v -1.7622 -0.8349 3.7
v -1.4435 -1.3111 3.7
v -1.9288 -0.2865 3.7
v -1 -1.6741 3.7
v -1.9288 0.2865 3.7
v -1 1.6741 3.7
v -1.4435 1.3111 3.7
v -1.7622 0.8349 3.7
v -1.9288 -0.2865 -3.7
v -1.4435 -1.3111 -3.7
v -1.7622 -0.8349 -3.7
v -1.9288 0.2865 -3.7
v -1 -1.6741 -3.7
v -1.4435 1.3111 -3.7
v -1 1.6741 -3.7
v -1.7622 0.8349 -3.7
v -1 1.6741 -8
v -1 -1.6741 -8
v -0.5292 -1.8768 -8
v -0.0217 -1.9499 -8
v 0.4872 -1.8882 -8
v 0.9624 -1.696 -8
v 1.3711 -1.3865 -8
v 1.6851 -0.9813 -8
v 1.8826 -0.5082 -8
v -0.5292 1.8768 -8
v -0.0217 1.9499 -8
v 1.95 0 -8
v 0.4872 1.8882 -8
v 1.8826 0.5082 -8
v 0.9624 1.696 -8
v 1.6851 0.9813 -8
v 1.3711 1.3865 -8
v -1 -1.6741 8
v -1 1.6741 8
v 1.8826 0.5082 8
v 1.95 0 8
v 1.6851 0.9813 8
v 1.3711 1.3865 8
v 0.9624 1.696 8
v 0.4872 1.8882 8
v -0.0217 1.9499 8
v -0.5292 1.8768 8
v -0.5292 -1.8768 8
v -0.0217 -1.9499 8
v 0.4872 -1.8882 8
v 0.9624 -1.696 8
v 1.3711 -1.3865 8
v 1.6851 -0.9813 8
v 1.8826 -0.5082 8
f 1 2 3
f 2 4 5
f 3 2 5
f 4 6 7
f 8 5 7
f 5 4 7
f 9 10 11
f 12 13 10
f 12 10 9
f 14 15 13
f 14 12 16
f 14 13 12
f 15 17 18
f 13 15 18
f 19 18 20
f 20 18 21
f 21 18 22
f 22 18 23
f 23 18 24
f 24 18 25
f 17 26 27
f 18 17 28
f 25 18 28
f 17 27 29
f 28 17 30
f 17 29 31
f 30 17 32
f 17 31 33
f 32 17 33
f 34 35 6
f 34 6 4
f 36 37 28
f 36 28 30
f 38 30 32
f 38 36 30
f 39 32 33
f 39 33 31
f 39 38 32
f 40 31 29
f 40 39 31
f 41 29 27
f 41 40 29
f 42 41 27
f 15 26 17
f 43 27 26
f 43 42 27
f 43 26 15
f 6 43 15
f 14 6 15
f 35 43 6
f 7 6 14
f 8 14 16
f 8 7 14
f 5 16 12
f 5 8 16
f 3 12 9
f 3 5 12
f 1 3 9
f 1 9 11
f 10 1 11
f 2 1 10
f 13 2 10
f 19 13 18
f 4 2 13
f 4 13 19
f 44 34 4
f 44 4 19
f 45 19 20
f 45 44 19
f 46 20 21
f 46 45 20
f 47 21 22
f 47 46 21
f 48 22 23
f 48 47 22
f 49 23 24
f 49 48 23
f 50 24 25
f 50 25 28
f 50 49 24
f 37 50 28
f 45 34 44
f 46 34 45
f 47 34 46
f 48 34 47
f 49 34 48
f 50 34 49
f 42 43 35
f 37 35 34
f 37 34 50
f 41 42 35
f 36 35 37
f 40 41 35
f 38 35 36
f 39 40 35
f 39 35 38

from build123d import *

# Parameters (mm, degrees)
SKETCH2_R           = 1.95
BOSS_EXTRUDE1_DEPTH = 8
CUT_EXTRUDE1_DEPTH  = 4.3


with BuildPart() as part:
    # Sketch2 → Boss-Extrude1 (new body, symmetric)
    with BuildSketch(Plane.XY):
        Circle(SKETCH2_R)
    extrude(amount=BOSS_EXTRUDE1_DEPTH, both=True)

    # Sketch4 → Cut-Extrude1 (cut)
    with BuildSketch(Plane(origin=(0, 0, -8), x_dir=(-1, 0, 0), z_dir=(0, 0, -1))):
        with BuildLine():
            Line((1, 1.674066904), (1, -1.674066904))
            ThreePointArc((1, -1.674066904), (1.95, 0), (1, 1.674066904))
        make_face()
    cut_extrude1 = extrude(amount=-CUT_EXTRUDE1_DEPTH, mode=Mode.SUBTRACT)

    # Mirror1: Cut-Extrude1 across plane
    add(cut_extrude1.mirror(Plane.XY), mode=Mode.SUBTRACT)


solid = part.part
